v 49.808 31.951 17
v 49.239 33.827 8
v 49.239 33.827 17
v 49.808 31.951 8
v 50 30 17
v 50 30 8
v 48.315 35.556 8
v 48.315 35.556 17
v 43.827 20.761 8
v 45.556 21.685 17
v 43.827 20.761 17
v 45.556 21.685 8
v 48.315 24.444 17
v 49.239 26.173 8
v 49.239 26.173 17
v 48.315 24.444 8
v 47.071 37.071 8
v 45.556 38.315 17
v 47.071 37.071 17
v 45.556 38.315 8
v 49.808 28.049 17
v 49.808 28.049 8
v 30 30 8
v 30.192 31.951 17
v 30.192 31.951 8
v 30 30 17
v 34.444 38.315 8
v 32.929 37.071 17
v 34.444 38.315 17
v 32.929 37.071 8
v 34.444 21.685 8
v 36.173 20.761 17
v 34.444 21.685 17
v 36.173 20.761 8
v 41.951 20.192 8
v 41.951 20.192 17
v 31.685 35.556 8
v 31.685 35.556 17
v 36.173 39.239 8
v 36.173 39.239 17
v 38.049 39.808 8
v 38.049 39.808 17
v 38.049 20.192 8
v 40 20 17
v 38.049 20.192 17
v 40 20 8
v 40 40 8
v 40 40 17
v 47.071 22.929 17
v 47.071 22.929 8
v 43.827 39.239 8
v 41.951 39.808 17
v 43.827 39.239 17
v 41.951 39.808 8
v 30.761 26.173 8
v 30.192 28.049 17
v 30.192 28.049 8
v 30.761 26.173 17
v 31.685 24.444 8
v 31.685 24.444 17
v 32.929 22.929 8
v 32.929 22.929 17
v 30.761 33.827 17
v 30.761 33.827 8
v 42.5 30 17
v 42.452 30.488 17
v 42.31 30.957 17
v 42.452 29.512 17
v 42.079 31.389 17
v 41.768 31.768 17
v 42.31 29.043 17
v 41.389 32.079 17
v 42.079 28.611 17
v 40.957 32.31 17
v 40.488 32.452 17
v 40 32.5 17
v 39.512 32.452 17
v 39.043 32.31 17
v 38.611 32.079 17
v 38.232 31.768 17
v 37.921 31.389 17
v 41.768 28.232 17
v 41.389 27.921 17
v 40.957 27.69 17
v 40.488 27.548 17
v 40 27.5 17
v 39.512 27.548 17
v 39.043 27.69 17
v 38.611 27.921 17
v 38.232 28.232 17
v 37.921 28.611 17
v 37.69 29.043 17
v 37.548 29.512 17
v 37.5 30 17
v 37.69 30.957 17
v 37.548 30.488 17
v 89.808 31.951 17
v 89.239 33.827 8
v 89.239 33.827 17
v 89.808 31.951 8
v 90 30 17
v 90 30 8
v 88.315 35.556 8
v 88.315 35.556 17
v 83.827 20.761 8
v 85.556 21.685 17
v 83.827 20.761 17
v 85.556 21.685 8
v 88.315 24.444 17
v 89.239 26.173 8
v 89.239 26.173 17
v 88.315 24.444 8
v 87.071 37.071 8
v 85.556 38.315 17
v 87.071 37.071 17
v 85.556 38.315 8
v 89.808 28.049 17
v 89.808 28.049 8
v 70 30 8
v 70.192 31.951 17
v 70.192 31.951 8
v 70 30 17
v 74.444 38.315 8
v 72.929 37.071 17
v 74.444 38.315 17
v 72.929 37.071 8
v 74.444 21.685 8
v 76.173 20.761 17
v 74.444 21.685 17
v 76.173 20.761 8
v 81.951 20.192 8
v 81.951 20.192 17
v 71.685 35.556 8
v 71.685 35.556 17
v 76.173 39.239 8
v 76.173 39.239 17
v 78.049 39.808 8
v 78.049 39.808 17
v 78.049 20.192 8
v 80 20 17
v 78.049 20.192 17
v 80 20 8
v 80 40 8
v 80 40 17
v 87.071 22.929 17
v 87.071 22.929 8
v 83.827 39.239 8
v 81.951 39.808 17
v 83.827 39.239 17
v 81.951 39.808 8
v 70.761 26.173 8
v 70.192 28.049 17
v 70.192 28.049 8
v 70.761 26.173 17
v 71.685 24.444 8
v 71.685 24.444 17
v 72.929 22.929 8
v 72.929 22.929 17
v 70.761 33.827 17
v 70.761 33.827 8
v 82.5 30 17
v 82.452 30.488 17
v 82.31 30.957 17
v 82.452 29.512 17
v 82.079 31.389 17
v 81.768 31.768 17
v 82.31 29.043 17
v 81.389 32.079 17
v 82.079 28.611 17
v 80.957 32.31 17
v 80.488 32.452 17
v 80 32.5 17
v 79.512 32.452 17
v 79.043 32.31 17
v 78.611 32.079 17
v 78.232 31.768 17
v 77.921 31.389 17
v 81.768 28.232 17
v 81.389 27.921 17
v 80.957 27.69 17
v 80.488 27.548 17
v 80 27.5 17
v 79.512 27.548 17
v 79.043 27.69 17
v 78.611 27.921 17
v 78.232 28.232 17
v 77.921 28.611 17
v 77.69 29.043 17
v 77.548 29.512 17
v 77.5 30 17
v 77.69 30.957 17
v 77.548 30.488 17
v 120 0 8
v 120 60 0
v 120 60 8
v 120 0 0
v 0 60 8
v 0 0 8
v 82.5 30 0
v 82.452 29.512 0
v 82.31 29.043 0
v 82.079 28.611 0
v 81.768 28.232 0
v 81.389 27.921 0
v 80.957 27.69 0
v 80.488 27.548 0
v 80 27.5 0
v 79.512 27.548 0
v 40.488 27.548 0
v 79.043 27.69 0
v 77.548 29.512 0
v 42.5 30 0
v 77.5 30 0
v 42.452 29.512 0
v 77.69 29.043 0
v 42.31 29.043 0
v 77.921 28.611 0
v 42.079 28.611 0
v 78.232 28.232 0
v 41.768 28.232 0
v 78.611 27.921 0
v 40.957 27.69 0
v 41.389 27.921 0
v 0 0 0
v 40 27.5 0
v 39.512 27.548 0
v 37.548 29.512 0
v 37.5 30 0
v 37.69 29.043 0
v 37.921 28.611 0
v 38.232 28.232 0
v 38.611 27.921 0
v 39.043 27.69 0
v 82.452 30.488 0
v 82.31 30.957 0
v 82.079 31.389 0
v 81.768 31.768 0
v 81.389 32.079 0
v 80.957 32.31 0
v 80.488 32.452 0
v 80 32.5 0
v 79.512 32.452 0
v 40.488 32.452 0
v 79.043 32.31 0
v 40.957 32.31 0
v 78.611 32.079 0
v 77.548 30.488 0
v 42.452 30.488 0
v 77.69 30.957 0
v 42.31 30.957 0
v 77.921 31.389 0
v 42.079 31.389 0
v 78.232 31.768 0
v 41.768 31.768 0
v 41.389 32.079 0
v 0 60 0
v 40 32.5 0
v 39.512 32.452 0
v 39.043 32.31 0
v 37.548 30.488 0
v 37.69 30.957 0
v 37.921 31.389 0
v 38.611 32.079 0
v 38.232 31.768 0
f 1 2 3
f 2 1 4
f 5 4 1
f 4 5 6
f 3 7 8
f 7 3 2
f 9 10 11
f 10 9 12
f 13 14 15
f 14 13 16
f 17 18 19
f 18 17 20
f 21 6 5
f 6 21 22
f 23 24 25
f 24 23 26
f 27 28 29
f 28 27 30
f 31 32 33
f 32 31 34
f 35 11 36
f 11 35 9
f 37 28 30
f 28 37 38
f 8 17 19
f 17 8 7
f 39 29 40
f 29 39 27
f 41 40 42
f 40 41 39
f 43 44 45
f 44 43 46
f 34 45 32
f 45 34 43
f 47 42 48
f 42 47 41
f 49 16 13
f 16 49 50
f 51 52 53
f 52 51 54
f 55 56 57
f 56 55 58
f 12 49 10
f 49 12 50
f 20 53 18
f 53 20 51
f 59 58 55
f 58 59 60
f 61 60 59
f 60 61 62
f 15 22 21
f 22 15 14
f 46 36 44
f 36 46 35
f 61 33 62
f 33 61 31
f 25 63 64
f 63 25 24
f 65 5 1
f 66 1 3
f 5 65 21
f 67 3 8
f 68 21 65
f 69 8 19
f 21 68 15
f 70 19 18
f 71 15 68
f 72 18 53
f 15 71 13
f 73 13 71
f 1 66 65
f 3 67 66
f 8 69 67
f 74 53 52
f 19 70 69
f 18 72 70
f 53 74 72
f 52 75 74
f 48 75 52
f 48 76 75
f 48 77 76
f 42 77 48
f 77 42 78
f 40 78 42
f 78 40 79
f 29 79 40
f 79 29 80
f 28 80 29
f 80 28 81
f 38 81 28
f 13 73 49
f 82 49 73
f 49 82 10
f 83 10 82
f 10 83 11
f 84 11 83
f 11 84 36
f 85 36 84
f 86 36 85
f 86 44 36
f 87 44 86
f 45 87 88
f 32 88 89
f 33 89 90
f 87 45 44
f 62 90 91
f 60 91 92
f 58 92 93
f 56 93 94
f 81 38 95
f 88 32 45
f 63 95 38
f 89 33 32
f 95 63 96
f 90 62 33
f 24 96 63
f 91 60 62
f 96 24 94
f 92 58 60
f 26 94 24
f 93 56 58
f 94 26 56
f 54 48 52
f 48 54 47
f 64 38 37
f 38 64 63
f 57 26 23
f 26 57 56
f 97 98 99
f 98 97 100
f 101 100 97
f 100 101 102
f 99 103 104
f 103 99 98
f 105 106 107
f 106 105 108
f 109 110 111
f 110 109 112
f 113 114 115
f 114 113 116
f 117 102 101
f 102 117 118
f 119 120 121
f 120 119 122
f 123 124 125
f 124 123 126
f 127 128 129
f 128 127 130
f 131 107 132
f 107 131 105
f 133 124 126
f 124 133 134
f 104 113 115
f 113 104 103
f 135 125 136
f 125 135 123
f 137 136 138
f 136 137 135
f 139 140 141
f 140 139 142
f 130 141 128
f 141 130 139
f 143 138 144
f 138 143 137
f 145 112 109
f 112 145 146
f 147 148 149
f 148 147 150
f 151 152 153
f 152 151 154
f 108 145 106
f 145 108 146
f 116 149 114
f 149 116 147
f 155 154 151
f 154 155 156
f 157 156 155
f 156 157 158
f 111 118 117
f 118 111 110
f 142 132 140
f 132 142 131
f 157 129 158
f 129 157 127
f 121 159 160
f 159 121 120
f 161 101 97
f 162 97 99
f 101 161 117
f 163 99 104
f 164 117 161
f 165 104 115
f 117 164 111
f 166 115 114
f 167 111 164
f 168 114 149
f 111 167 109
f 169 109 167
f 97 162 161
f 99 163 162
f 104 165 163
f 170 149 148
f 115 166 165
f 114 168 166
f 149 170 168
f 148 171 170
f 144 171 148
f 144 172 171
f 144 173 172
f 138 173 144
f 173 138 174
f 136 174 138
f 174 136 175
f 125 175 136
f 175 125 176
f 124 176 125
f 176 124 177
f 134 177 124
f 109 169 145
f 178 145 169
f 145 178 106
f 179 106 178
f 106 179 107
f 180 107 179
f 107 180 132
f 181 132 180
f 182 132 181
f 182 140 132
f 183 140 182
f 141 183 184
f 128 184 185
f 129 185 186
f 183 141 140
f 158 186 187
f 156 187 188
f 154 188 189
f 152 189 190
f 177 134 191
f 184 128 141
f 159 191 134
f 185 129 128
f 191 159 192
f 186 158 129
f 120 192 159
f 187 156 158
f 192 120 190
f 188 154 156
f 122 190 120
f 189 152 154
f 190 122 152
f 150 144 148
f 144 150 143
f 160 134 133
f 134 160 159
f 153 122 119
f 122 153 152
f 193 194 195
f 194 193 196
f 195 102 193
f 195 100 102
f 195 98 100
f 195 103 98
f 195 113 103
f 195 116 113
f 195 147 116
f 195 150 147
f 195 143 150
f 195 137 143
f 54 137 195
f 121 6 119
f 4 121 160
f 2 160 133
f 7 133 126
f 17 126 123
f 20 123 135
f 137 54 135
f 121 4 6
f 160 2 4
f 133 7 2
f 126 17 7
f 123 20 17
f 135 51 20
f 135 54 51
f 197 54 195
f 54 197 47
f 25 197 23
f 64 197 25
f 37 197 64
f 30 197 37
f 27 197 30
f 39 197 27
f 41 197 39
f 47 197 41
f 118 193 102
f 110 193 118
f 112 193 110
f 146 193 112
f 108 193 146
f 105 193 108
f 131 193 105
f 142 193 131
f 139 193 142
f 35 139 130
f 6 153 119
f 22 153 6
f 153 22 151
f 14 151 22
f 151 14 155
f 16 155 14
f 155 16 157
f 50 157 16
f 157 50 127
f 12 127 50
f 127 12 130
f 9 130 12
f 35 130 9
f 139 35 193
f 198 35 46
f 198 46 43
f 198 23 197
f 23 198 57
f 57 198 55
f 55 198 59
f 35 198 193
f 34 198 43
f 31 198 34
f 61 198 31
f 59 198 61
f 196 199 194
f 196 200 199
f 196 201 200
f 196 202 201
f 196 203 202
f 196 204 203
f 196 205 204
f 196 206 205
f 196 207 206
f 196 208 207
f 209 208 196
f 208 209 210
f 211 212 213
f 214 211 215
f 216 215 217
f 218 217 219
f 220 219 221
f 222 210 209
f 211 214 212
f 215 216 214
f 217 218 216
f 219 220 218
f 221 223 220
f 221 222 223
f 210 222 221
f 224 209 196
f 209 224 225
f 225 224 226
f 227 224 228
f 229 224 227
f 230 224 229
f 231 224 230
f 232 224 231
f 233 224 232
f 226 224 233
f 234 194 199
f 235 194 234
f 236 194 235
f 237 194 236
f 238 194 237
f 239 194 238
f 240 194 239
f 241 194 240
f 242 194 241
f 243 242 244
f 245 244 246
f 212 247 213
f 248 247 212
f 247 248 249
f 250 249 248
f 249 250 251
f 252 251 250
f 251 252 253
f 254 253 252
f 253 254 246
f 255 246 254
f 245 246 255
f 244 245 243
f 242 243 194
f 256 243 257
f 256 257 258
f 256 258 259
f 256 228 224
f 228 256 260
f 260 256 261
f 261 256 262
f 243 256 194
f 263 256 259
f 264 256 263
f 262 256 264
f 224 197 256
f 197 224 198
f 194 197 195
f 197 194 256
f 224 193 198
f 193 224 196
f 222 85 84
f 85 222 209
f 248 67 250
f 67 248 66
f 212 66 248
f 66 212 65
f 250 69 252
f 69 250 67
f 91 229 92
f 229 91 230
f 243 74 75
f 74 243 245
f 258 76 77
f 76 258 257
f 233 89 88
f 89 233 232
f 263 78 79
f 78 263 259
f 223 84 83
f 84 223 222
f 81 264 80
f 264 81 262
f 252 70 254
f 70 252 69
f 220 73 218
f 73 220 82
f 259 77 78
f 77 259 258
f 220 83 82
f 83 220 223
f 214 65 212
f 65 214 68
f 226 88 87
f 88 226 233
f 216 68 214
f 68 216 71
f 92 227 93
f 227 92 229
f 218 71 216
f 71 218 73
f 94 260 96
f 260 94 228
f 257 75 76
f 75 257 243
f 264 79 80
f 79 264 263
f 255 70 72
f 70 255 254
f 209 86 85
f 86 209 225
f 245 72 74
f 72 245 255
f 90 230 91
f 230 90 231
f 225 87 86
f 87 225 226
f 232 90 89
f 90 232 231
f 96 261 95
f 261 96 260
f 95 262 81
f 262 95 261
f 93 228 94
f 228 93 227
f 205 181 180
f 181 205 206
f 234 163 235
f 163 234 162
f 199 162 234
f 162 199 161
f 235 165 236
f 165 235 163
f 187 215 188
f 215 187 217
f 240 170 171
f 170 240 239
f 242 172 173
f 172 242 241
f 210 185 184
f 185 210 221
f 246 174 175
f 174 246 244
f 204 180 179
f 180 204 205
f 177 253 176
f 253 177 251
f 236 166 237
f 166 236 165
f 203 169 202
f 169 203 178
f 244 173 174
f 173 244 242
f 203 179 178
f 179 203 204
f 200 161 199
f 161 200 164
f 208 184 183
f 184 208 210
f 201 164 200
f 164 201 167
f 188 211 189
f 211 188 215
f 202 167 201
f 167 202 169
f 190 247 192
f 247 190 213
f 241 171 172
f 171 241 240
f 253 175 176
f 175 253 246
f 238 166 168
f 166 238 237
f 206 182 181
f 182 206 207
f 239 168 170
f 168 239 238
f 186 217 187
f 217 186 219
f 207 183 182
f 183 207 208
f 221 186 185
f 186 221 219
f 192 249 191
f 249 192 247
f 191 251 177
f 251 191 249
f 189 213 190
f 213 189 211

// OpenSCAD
$fn = 32;

// ----------------------------------------------------------------------
// Drill jig: two_boss jig
// ----------------------------------------------------------------------

// --- parameters (mm) ---
plate_l = 120;            // plate length, X
plate_w = 60;             // plate width, Y
plate_t = 8;              // plate thickness
boss_d = 20;              // guide boss diameter
boss_h = 10;              // boss height above the plate
guide_d = 5;              // guide hole diameter
boss_pitch = 40;          // boss pitch
fit_tol = 0.1;            // tolerance for press fits, mm
free_tol = 0.5;           // tolerance for clearance fits, mm

n_boss = 2;  // guide bosses
boss_x0 = (plate_l - (n_boss - 1) * boss_pitch) / 2;  // first boss X
boss_top = plate_t - 1 + boss_h;  // boss crown height
total_h = boss_top;  // overall height

difference() {
  union() {
  cube([plate_l, plate_w, plate_t]);
  for (i = [0 : n_boss - 1])
    translate([boss_x0 + i * boss_pitch, plate_w / 2, plate_t - 1])
      cylinder(h = boss_h, d = boss_d);
  }
  for (i = [0 : n_boss - 1])
    translate([boss_x0 + i * boss_pitch, plate_w / 2, -1])
      cylinder(h = plate_t + boss_h, d = guide_d);
}
